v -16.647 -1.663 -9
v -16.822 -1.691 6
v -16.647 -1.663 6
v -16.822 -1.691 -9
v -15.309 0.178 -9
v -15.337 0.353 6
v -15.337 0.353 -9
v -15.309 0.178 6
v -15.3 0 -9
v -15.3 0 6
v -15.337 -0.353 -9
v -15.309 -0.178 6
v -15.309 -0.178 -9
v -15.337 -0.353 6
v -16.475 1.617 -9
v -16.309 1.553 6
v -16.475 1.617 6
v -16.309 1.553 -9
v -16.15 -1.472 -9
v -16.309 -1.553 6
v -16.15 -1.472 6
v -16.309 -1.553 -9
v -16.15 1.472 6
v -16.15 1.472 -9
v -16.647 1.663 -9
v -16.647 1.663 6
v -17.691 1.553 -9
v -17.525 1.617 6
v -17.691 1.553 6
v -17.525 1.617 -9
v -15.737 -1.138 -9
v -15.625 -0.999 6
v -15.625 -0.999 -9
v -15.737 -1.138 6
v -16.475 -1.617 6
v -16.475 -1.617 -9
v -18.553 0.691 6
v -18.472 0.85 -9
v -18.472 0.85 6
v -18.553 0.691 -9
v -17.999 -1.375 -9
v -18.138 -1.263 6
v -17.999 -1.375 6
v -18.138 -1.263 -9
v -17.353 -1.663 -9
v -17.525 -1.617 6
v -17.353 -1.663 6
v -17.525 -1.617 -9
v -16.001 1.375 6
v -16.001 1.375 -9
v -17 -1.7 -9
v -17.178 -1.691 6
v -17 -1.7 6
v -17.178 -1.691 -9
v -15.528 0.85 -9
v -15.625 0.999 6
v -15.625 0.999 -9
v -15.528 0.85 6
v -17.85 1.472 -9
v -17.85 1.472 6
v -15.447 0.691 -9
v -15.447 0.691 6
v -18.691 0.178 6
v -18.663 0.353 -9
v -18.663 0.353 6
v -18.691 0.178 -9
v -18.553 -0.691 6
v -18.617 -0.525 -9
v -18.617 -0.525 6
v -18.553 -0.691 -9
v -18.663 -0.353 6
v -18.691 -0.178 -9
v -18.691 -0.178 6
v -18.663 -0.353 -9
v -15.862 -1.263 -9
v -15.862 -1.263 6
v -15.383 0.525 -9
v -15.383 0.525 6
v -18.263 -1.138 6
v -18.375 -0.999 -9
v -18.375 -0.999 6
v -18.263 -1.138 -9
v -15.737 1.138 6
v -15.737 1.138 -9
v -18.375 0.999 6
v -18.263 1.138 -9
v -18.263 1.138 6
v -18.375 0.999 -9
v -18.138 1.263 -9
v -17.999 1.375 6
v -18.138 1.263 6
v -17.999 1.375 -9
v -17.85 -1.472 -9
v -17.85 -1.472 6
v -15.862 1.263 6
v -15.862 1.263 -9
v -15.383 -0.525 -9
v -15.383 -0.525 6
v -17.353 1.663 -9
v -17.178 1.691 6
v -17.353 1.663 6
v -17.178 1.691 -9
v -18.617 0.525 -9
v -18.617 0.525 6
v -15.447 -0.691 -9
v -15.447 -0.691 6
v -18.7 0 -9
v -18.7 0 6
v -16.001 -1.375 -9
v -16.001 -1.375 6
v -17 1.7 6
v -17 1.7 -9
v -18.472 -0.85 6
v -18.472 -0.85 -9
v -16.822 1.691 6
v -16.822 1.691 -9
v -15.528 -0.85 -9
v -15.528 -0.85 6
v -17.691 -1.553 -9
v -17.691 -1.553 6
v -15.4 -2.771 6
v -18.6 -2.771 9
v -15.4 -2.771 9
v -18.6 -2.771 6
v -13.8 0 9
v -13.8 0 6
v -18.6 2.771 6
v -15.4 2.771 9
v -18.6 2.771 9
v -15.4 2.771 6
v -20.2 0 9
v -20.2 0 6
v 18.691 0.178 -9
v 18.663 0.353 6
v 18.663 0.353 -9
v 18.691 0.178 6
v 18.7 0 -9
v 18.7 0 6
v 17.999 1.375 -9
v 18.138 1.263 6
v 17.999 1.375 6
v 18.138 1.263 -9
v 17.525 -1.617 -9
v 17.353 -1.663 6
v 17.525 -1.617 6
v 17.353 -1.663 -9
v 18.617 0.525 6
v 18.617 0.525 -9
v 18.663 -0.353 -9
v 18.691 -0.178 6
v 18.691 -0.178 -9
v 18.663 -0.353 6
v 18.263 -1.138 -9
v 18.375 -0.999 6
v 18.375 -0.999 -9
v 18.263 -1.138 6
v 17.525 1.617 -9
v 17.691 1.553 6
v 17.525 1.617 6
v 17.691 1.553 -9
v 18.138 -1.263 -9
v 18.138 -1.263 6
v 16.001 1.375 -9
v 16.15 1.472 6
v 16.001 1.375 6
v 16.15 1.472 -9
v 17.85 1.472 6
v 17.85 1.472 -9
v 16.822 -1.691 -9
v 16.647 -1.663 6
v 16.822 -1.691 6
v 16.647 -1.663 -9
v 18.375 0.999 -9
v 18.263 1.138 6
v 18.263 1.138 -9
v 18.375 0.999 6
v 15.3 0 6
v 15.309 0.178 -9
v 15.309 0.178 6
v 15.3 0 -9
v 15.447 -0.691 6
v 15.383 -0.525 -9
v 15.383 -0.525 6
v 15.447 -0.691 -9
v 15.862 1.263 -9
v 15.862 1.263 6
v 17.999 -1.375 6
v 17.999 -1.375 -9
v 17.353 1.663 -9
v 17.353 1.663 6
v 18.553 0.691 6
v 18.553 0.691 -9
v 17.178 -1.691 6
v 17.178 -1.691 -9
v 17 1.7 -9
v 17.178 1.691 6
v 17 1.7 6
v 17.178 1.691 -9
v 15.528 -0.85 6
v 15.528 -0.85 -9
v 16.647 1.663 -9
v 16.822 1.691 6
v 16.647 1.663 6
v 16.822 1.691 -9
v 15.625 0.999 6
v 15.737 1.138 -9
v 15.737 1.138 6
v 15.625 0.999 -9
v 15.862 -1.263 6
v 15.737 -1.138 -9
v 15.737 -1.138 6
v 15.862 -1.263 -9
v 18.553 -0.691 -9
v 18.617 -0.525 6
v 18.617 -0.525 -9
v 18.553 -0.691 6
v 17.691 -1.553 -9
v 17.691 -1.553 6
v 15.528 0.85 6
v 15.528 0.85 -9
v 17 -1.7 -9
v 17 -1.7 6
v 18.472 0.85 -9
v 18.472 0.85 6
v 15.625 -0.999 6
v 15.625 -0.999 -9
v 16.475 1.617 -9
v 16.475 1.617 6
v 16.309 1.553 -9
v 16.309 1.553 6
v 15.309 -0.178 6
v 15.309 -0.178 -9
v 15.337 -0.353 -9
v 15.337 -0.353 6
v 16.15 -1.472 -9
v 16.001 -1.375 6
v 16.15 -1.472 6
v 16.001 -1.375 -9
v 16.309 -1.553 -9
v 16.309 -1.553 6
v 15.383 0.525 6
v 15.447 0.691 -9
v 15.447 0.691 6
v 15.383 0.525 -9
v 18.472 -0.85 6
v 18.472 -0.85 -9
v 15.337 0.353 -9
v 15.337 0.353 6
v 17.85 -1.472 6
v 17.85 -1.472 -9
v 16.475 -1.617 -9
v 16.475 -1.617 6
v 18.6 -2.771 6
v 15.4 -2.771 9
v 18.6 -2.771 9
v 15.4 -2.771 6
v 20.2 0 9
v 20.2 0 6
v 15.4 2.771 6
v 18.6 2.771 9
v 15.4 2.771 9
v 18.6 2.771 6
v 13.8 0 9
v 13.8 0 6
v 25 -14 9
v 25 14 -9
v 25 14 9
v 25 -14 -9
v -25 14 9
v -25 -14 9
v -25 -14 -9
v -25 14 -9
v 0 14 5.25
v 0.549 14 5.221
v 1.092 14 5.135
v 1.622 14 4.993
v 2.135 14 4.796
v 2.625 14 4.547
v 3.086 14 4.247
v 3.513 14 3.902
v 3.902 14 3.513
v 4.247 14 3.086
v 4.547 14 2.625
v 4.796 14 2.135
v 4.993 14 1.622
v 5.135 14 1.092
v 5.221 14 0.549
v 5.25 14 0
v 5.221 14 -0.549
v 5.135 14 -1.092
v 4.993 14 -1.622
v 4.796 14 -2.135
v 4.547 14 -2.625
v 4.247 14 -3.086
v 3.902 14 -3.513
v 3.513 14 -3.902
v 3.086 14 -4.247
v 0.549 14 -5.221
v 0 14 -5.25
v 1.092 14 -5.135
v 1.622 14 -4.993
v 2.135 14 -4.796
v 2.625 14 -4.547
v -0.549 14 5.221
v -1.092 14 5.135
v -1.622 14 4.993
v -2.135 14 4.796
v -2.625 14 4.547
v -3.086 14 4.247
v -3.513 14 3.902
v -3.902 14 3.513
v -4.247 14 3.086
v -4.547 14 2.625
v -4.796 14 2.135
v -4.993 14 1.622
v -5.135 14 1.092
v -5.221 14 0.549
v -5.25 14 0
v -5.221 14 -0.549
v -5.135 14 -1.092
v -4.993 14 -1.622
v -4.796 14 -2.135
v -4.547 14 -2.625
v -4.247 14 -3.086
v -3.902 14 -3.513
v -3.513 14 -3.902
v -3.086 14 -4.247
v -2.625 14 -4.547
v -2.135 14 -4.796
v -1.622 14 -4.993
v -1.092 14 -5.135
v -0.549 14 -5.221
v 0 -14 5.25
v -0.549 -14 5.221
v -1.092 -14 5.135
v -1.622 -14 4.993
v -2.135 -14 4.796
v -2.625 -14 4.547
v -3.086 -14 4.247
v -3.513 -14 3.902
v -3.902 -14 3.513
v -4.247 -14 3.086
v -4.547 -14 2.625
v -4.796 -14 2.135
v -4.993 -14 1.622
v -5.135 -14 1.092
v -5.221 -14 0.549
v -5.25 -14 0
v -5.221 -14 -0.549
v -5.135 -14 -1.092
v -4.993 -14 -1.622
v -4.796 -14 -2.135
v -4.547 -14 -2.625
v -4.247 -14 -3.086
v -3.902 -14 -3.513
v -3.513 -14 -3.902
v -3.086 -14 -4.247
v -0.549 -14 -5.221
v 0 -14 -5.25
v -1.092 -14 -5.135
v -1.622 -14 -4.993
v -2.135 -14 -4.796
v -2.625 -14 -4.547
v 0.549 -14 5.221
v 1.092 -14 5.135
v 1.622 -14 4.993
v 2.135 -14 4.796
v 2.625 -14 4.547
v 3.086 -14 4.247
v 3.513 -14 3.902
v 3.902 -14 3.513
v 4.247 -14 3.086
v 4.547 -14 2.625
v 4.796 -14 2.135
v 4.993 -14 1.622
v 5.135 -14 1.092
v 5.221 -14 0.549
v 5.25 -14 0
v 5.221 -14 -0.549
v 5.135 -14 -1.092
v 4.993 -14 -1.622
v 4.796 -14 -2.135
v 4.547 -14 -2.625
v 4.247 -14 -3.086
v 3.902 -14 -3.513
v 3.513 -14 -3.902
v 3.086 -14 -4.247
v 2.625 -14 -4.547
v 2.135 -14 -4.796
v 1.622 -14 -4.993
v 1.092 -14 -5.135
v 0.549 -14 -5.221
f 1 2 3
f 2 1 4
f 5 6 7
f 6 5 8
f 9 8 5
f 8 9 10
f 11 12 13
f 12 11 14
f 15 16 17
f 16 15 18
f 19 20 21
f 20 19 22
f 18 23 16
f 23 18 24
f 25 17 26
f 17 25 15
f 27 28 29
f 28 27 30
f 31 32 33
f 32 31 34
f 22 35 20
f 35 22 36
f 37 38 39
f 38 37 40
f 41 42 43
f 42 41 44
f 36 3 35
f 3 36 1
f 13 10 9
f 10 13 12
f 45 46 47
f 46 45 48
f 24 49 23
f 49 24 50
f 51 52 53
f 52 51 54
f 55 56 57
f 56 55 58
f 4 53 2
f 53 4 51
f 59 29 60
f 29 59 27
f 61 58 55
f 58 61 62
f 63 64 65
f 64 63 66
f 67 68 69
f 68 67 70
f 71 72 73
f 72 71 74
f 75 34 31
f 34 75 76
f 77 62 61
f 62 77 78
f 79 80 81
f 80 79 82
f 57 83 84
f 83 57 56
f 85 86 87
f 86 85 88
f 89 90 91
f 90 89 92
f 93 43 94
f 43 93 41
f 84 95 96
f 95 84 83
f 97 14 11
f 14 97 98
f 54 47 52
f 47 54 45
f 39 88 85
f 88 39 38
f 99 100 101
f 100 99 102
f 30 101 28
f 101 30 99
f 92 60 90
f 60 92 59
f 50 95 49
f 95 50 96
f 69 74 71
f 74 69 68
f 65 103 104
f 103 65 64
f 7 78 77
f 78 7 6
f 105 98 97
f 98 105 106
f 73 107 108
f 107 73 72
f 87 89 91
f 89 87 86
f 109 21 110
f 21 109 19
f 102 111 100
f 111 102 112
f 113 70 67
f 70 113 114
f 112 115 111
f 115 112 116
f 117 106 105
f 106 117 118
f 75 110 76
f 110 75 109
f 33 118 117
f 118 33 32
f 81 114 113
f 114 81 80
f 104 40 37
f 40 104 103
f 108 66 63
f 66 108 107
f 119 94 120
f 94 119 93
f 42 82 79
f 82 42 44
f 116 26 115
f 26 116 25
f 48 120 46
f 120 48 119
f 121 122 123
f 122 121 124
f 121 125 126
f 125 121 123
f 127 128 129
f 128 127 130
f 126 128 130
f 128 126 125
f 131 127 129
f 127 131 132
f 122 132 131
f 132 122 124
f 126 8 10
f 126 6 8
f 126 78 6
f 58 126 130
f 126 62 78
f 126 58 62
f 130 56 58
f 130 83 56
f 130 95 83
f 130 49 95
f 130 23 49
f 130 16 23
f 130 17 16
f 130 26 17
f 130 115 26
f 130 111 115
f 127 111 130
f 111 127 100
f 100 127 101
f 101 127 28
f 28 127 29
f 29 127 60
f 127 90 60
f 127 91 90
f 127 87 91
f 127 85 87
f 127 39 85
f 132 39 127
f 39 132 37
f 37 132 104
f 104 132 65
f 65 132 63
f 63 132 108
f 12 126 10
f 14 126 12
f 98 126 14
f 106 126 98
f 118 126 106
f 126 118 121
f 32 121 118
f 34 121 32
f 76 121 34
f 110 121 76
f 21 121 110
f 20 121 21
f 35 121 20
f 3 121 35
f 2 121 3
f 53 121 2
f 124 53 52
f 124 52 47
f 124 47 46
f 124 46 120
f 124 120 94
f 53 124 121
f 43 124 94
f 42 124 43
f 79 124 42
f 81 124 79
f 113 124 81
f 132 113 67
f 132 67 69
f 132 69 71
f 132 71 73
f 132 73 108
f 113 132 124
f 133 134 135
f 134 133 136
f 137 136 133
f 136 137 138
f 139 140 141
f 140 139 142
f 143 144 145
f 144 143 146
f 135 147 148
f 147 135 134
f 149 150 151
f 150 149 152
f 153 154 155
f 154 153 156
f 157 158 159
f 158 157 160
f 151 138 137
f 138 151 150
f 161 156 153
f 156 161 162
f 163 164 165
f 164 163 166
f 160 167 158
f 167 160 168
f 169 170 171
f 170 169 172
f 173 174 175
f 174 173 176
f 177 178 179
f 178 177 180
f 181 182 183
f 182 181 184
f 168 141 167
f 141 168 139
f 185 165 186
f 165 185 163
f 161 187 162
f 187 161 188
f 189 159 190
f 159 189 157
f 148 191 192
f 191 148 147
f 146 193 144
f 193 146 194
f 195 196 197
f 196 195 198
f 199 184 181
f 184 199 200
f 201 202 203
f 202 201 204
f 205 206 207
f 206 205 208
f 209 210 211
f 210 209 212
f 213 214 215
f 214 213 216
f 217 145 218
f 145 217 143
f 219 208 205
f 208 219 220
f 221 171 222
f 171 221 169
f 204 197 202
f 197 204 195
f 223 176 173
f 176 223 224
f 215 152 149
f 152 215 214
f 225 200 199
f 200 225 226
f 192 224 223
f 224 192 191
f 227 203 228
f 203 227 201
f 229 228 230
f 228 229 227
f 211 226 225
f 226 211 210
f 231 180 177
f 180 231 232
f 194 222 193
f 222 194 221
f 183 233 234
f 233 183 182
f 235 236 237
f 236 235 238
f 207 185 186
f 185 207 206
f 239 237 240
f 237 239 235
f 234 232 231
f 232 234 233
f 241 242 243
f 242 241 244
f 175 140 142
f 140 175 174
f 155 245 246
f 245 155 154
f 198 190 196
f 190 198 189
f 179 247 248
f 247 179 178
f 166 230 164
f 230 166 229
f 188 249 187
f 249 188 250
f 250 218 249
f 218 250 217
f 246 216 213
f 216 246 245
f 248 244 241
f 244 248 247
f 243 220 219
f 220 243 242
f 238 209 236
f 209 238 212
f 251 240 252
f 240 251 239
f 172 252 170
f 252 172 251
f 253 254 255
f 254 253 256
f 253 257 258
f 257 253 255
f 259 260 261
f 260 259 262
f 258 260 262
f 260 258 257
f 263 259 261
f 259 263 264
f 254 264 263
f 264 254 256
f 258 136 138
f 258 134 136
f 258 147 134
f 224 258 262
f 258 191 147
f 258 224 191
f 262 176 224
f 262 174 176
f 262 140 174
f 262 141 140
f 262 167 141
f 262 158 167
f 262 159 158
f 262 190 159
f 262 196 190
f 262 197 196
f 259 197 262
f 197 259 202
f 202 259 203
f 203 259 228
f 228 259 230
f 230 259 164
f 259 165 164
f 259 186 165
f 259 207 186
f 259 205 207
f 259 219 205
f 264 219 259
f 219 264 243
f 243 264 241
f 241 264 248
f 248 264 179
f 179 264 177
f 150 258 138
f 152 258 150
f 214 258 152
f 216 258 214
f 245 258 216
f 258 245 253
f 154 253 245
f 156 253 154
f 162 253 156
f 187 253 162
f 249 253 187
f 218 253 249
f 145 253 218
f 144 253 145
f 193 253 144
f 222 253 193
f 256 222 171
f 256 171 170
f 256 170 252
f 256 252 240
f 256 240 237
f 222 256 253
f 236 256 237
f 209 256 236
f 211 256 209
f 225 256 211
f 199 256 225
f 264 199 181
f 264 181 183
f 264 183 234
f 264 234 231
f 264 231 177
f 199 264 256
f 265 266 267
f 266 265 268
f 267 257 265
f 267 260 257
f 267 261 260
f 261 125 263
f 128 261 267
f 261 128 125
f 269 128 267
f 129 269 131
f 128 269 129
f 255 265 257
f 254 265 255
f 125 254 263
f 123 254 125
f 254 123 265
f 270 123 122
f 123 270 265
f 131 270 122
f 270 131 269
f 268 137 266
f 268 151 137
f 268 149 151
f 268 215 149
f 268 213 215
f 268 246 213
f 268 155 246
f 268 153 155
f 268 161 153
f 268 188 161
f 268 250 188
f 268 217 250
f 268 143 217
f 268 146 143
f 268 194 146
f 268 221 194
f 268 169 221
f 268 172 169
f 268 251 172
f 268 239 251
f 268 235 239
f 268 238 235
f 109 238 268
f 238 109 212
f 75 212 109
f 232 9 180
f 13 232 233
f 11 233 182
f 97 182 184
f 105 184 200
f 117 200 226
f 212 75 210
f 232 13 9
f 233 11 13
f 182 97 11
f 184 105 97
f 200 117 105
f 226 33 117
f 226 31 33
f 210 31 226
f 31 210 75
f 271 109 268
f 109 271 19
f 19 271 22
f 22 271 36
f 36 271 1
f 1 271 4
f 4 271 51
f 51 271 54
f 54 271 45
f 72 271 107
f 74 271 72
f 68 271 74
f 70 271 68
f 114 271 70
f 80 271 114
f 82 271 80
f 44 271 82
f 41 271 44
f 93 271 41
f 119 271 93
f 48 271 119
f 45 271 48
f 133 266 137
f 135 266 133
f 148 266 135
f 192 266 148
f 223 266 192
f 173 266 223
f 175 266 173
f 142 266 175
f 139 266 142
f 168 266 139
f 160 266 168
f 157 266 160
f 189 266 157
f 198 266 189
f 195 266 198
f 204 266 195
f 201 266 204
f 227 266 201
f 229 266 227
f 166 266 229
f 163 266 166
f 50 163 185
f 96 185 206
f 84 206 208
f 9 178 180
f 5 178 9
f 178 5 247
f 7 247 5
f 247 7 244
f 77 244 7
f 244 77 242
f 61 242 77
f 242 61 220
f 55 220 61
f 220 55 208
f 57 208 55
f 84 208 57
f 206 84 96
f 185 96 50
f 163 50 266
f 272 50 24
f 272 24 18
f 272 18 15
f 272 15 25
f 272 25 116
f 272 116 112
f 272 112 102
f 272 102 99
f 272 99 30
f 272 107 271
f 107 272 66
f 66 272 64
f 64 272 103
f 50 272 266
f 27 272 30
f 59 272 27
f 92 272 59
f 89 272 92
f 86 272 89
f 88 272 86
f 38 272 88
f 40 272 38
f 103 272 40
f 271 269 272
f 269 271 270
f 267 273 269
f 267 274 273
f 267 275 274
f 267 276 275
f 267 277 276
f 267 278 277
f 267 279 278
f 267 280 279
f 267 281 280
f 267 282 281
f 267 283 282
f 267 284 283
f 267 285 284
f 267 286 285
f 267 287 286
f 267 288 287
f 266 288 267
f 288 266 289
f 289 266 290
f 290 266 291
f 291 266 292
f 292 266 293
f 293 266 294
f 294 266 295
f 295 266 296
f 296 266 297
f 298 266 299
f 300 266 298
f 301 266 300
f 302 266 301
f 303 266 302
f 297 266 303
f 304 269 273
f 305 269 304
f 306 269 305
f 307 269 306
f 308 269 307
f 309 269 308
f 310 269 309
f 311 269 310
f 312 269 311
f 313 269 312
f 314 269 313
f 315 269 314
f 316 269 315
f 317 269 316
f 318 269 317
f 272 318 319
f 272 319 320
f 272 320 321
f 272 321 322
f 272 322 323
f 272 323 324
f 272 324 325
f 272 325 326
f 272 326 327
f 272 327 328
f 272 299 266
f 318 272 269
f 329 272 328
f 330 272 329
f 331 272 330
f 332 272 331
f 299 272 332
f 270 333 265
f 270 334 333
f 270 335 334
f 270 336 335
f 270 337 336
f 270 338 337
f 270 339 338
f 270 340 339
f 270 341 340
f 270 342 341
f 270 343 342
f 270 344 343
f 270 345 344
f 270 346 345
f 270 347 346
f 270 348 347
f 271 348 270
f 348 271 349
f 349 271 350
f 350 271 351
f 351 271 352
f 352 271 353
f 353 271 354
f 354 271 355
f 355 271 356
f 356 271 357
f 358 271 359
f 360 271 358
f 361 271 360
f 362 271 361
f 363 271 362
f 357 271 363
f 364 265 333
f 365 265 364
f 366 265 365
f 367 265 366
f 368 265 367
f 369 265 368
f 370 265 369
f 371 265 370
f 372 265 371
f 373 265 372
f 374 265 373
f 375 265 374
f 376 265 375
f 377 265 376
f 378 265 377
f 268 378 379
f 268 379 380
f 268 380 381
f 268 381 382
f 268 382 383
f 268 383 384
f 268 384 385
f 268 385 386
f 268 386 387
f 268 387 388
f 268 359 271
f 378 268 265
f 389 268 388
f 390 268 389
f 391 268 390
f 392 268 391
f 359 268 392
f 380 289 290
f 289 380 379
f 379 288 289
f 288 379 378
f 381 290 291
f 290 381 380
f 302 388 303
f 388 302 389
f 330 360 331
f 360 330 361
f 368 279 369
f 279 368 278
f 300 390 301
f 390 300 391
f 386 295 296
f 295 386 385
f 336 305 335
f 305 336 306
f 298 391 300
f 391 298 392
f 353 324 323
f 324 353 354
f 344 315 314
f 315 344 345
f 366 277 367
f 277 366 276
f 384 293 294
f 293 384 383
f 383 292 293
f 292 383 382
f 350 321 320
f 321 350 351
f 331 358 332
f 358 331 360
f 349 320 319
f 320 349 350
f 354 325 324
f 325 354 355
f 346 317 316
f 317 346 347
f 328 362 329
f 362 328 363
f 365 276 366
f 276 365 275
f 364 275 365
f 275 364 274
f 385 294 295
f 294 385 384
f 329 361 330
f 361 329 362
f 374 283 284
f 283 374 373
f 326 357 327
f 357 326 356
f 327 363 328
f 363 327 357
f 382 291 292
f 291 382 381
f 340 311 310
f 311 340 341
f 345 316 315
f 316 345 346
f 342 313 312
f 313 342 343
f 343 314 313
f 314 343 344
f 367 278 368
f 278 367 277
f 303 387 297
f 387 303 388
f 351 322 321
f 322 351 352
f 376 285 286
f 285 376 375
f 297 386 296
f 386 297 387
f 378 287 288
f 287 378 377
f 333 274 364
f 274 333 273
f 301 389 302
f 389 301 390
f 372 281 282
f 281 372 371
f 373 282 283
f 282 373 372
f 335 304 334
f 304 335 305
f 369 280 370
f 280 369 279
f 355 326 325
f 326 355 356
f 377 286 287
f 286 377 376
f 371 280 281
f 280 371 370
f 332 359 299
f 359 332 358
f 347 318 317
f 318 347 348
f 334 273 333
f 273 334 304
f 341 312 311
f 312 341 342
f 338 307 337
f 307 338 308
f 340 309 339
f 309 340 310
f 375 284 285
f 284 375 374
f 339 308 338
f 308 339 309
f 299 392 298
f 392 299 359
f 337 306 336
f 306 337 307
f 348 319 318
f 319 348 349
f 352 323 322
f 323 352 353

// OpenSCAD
// Cable strain-relief clamp for 10 mm bundle.
$fn = 60;
eps = 0.02;
body_l = 50;
body_w = 28;
body_h = 18;
cable_d = 10.5;
bolt_pitch = 34;
difference() {
    cube([body_l, body_w, body_h], center = true);
    translate([0, -body_w / 2 - eps, 0]) rotate([-90, 0, 0]) cylinder(d = cable_d, h = body_w + 2 * eps);
    for (x = [-bolt_pitch / 2, bolt_pitch / 2]) {
        translate([x, 0, -body_h / 2 - eps]) cylinder(d = 3.4, h = body_h + 2 * eps);
        translate([x, 0, body_h / 2 - 3]) cylinder(d = 6.4, h = 3 + eps, $fn = 6);
    }
}
